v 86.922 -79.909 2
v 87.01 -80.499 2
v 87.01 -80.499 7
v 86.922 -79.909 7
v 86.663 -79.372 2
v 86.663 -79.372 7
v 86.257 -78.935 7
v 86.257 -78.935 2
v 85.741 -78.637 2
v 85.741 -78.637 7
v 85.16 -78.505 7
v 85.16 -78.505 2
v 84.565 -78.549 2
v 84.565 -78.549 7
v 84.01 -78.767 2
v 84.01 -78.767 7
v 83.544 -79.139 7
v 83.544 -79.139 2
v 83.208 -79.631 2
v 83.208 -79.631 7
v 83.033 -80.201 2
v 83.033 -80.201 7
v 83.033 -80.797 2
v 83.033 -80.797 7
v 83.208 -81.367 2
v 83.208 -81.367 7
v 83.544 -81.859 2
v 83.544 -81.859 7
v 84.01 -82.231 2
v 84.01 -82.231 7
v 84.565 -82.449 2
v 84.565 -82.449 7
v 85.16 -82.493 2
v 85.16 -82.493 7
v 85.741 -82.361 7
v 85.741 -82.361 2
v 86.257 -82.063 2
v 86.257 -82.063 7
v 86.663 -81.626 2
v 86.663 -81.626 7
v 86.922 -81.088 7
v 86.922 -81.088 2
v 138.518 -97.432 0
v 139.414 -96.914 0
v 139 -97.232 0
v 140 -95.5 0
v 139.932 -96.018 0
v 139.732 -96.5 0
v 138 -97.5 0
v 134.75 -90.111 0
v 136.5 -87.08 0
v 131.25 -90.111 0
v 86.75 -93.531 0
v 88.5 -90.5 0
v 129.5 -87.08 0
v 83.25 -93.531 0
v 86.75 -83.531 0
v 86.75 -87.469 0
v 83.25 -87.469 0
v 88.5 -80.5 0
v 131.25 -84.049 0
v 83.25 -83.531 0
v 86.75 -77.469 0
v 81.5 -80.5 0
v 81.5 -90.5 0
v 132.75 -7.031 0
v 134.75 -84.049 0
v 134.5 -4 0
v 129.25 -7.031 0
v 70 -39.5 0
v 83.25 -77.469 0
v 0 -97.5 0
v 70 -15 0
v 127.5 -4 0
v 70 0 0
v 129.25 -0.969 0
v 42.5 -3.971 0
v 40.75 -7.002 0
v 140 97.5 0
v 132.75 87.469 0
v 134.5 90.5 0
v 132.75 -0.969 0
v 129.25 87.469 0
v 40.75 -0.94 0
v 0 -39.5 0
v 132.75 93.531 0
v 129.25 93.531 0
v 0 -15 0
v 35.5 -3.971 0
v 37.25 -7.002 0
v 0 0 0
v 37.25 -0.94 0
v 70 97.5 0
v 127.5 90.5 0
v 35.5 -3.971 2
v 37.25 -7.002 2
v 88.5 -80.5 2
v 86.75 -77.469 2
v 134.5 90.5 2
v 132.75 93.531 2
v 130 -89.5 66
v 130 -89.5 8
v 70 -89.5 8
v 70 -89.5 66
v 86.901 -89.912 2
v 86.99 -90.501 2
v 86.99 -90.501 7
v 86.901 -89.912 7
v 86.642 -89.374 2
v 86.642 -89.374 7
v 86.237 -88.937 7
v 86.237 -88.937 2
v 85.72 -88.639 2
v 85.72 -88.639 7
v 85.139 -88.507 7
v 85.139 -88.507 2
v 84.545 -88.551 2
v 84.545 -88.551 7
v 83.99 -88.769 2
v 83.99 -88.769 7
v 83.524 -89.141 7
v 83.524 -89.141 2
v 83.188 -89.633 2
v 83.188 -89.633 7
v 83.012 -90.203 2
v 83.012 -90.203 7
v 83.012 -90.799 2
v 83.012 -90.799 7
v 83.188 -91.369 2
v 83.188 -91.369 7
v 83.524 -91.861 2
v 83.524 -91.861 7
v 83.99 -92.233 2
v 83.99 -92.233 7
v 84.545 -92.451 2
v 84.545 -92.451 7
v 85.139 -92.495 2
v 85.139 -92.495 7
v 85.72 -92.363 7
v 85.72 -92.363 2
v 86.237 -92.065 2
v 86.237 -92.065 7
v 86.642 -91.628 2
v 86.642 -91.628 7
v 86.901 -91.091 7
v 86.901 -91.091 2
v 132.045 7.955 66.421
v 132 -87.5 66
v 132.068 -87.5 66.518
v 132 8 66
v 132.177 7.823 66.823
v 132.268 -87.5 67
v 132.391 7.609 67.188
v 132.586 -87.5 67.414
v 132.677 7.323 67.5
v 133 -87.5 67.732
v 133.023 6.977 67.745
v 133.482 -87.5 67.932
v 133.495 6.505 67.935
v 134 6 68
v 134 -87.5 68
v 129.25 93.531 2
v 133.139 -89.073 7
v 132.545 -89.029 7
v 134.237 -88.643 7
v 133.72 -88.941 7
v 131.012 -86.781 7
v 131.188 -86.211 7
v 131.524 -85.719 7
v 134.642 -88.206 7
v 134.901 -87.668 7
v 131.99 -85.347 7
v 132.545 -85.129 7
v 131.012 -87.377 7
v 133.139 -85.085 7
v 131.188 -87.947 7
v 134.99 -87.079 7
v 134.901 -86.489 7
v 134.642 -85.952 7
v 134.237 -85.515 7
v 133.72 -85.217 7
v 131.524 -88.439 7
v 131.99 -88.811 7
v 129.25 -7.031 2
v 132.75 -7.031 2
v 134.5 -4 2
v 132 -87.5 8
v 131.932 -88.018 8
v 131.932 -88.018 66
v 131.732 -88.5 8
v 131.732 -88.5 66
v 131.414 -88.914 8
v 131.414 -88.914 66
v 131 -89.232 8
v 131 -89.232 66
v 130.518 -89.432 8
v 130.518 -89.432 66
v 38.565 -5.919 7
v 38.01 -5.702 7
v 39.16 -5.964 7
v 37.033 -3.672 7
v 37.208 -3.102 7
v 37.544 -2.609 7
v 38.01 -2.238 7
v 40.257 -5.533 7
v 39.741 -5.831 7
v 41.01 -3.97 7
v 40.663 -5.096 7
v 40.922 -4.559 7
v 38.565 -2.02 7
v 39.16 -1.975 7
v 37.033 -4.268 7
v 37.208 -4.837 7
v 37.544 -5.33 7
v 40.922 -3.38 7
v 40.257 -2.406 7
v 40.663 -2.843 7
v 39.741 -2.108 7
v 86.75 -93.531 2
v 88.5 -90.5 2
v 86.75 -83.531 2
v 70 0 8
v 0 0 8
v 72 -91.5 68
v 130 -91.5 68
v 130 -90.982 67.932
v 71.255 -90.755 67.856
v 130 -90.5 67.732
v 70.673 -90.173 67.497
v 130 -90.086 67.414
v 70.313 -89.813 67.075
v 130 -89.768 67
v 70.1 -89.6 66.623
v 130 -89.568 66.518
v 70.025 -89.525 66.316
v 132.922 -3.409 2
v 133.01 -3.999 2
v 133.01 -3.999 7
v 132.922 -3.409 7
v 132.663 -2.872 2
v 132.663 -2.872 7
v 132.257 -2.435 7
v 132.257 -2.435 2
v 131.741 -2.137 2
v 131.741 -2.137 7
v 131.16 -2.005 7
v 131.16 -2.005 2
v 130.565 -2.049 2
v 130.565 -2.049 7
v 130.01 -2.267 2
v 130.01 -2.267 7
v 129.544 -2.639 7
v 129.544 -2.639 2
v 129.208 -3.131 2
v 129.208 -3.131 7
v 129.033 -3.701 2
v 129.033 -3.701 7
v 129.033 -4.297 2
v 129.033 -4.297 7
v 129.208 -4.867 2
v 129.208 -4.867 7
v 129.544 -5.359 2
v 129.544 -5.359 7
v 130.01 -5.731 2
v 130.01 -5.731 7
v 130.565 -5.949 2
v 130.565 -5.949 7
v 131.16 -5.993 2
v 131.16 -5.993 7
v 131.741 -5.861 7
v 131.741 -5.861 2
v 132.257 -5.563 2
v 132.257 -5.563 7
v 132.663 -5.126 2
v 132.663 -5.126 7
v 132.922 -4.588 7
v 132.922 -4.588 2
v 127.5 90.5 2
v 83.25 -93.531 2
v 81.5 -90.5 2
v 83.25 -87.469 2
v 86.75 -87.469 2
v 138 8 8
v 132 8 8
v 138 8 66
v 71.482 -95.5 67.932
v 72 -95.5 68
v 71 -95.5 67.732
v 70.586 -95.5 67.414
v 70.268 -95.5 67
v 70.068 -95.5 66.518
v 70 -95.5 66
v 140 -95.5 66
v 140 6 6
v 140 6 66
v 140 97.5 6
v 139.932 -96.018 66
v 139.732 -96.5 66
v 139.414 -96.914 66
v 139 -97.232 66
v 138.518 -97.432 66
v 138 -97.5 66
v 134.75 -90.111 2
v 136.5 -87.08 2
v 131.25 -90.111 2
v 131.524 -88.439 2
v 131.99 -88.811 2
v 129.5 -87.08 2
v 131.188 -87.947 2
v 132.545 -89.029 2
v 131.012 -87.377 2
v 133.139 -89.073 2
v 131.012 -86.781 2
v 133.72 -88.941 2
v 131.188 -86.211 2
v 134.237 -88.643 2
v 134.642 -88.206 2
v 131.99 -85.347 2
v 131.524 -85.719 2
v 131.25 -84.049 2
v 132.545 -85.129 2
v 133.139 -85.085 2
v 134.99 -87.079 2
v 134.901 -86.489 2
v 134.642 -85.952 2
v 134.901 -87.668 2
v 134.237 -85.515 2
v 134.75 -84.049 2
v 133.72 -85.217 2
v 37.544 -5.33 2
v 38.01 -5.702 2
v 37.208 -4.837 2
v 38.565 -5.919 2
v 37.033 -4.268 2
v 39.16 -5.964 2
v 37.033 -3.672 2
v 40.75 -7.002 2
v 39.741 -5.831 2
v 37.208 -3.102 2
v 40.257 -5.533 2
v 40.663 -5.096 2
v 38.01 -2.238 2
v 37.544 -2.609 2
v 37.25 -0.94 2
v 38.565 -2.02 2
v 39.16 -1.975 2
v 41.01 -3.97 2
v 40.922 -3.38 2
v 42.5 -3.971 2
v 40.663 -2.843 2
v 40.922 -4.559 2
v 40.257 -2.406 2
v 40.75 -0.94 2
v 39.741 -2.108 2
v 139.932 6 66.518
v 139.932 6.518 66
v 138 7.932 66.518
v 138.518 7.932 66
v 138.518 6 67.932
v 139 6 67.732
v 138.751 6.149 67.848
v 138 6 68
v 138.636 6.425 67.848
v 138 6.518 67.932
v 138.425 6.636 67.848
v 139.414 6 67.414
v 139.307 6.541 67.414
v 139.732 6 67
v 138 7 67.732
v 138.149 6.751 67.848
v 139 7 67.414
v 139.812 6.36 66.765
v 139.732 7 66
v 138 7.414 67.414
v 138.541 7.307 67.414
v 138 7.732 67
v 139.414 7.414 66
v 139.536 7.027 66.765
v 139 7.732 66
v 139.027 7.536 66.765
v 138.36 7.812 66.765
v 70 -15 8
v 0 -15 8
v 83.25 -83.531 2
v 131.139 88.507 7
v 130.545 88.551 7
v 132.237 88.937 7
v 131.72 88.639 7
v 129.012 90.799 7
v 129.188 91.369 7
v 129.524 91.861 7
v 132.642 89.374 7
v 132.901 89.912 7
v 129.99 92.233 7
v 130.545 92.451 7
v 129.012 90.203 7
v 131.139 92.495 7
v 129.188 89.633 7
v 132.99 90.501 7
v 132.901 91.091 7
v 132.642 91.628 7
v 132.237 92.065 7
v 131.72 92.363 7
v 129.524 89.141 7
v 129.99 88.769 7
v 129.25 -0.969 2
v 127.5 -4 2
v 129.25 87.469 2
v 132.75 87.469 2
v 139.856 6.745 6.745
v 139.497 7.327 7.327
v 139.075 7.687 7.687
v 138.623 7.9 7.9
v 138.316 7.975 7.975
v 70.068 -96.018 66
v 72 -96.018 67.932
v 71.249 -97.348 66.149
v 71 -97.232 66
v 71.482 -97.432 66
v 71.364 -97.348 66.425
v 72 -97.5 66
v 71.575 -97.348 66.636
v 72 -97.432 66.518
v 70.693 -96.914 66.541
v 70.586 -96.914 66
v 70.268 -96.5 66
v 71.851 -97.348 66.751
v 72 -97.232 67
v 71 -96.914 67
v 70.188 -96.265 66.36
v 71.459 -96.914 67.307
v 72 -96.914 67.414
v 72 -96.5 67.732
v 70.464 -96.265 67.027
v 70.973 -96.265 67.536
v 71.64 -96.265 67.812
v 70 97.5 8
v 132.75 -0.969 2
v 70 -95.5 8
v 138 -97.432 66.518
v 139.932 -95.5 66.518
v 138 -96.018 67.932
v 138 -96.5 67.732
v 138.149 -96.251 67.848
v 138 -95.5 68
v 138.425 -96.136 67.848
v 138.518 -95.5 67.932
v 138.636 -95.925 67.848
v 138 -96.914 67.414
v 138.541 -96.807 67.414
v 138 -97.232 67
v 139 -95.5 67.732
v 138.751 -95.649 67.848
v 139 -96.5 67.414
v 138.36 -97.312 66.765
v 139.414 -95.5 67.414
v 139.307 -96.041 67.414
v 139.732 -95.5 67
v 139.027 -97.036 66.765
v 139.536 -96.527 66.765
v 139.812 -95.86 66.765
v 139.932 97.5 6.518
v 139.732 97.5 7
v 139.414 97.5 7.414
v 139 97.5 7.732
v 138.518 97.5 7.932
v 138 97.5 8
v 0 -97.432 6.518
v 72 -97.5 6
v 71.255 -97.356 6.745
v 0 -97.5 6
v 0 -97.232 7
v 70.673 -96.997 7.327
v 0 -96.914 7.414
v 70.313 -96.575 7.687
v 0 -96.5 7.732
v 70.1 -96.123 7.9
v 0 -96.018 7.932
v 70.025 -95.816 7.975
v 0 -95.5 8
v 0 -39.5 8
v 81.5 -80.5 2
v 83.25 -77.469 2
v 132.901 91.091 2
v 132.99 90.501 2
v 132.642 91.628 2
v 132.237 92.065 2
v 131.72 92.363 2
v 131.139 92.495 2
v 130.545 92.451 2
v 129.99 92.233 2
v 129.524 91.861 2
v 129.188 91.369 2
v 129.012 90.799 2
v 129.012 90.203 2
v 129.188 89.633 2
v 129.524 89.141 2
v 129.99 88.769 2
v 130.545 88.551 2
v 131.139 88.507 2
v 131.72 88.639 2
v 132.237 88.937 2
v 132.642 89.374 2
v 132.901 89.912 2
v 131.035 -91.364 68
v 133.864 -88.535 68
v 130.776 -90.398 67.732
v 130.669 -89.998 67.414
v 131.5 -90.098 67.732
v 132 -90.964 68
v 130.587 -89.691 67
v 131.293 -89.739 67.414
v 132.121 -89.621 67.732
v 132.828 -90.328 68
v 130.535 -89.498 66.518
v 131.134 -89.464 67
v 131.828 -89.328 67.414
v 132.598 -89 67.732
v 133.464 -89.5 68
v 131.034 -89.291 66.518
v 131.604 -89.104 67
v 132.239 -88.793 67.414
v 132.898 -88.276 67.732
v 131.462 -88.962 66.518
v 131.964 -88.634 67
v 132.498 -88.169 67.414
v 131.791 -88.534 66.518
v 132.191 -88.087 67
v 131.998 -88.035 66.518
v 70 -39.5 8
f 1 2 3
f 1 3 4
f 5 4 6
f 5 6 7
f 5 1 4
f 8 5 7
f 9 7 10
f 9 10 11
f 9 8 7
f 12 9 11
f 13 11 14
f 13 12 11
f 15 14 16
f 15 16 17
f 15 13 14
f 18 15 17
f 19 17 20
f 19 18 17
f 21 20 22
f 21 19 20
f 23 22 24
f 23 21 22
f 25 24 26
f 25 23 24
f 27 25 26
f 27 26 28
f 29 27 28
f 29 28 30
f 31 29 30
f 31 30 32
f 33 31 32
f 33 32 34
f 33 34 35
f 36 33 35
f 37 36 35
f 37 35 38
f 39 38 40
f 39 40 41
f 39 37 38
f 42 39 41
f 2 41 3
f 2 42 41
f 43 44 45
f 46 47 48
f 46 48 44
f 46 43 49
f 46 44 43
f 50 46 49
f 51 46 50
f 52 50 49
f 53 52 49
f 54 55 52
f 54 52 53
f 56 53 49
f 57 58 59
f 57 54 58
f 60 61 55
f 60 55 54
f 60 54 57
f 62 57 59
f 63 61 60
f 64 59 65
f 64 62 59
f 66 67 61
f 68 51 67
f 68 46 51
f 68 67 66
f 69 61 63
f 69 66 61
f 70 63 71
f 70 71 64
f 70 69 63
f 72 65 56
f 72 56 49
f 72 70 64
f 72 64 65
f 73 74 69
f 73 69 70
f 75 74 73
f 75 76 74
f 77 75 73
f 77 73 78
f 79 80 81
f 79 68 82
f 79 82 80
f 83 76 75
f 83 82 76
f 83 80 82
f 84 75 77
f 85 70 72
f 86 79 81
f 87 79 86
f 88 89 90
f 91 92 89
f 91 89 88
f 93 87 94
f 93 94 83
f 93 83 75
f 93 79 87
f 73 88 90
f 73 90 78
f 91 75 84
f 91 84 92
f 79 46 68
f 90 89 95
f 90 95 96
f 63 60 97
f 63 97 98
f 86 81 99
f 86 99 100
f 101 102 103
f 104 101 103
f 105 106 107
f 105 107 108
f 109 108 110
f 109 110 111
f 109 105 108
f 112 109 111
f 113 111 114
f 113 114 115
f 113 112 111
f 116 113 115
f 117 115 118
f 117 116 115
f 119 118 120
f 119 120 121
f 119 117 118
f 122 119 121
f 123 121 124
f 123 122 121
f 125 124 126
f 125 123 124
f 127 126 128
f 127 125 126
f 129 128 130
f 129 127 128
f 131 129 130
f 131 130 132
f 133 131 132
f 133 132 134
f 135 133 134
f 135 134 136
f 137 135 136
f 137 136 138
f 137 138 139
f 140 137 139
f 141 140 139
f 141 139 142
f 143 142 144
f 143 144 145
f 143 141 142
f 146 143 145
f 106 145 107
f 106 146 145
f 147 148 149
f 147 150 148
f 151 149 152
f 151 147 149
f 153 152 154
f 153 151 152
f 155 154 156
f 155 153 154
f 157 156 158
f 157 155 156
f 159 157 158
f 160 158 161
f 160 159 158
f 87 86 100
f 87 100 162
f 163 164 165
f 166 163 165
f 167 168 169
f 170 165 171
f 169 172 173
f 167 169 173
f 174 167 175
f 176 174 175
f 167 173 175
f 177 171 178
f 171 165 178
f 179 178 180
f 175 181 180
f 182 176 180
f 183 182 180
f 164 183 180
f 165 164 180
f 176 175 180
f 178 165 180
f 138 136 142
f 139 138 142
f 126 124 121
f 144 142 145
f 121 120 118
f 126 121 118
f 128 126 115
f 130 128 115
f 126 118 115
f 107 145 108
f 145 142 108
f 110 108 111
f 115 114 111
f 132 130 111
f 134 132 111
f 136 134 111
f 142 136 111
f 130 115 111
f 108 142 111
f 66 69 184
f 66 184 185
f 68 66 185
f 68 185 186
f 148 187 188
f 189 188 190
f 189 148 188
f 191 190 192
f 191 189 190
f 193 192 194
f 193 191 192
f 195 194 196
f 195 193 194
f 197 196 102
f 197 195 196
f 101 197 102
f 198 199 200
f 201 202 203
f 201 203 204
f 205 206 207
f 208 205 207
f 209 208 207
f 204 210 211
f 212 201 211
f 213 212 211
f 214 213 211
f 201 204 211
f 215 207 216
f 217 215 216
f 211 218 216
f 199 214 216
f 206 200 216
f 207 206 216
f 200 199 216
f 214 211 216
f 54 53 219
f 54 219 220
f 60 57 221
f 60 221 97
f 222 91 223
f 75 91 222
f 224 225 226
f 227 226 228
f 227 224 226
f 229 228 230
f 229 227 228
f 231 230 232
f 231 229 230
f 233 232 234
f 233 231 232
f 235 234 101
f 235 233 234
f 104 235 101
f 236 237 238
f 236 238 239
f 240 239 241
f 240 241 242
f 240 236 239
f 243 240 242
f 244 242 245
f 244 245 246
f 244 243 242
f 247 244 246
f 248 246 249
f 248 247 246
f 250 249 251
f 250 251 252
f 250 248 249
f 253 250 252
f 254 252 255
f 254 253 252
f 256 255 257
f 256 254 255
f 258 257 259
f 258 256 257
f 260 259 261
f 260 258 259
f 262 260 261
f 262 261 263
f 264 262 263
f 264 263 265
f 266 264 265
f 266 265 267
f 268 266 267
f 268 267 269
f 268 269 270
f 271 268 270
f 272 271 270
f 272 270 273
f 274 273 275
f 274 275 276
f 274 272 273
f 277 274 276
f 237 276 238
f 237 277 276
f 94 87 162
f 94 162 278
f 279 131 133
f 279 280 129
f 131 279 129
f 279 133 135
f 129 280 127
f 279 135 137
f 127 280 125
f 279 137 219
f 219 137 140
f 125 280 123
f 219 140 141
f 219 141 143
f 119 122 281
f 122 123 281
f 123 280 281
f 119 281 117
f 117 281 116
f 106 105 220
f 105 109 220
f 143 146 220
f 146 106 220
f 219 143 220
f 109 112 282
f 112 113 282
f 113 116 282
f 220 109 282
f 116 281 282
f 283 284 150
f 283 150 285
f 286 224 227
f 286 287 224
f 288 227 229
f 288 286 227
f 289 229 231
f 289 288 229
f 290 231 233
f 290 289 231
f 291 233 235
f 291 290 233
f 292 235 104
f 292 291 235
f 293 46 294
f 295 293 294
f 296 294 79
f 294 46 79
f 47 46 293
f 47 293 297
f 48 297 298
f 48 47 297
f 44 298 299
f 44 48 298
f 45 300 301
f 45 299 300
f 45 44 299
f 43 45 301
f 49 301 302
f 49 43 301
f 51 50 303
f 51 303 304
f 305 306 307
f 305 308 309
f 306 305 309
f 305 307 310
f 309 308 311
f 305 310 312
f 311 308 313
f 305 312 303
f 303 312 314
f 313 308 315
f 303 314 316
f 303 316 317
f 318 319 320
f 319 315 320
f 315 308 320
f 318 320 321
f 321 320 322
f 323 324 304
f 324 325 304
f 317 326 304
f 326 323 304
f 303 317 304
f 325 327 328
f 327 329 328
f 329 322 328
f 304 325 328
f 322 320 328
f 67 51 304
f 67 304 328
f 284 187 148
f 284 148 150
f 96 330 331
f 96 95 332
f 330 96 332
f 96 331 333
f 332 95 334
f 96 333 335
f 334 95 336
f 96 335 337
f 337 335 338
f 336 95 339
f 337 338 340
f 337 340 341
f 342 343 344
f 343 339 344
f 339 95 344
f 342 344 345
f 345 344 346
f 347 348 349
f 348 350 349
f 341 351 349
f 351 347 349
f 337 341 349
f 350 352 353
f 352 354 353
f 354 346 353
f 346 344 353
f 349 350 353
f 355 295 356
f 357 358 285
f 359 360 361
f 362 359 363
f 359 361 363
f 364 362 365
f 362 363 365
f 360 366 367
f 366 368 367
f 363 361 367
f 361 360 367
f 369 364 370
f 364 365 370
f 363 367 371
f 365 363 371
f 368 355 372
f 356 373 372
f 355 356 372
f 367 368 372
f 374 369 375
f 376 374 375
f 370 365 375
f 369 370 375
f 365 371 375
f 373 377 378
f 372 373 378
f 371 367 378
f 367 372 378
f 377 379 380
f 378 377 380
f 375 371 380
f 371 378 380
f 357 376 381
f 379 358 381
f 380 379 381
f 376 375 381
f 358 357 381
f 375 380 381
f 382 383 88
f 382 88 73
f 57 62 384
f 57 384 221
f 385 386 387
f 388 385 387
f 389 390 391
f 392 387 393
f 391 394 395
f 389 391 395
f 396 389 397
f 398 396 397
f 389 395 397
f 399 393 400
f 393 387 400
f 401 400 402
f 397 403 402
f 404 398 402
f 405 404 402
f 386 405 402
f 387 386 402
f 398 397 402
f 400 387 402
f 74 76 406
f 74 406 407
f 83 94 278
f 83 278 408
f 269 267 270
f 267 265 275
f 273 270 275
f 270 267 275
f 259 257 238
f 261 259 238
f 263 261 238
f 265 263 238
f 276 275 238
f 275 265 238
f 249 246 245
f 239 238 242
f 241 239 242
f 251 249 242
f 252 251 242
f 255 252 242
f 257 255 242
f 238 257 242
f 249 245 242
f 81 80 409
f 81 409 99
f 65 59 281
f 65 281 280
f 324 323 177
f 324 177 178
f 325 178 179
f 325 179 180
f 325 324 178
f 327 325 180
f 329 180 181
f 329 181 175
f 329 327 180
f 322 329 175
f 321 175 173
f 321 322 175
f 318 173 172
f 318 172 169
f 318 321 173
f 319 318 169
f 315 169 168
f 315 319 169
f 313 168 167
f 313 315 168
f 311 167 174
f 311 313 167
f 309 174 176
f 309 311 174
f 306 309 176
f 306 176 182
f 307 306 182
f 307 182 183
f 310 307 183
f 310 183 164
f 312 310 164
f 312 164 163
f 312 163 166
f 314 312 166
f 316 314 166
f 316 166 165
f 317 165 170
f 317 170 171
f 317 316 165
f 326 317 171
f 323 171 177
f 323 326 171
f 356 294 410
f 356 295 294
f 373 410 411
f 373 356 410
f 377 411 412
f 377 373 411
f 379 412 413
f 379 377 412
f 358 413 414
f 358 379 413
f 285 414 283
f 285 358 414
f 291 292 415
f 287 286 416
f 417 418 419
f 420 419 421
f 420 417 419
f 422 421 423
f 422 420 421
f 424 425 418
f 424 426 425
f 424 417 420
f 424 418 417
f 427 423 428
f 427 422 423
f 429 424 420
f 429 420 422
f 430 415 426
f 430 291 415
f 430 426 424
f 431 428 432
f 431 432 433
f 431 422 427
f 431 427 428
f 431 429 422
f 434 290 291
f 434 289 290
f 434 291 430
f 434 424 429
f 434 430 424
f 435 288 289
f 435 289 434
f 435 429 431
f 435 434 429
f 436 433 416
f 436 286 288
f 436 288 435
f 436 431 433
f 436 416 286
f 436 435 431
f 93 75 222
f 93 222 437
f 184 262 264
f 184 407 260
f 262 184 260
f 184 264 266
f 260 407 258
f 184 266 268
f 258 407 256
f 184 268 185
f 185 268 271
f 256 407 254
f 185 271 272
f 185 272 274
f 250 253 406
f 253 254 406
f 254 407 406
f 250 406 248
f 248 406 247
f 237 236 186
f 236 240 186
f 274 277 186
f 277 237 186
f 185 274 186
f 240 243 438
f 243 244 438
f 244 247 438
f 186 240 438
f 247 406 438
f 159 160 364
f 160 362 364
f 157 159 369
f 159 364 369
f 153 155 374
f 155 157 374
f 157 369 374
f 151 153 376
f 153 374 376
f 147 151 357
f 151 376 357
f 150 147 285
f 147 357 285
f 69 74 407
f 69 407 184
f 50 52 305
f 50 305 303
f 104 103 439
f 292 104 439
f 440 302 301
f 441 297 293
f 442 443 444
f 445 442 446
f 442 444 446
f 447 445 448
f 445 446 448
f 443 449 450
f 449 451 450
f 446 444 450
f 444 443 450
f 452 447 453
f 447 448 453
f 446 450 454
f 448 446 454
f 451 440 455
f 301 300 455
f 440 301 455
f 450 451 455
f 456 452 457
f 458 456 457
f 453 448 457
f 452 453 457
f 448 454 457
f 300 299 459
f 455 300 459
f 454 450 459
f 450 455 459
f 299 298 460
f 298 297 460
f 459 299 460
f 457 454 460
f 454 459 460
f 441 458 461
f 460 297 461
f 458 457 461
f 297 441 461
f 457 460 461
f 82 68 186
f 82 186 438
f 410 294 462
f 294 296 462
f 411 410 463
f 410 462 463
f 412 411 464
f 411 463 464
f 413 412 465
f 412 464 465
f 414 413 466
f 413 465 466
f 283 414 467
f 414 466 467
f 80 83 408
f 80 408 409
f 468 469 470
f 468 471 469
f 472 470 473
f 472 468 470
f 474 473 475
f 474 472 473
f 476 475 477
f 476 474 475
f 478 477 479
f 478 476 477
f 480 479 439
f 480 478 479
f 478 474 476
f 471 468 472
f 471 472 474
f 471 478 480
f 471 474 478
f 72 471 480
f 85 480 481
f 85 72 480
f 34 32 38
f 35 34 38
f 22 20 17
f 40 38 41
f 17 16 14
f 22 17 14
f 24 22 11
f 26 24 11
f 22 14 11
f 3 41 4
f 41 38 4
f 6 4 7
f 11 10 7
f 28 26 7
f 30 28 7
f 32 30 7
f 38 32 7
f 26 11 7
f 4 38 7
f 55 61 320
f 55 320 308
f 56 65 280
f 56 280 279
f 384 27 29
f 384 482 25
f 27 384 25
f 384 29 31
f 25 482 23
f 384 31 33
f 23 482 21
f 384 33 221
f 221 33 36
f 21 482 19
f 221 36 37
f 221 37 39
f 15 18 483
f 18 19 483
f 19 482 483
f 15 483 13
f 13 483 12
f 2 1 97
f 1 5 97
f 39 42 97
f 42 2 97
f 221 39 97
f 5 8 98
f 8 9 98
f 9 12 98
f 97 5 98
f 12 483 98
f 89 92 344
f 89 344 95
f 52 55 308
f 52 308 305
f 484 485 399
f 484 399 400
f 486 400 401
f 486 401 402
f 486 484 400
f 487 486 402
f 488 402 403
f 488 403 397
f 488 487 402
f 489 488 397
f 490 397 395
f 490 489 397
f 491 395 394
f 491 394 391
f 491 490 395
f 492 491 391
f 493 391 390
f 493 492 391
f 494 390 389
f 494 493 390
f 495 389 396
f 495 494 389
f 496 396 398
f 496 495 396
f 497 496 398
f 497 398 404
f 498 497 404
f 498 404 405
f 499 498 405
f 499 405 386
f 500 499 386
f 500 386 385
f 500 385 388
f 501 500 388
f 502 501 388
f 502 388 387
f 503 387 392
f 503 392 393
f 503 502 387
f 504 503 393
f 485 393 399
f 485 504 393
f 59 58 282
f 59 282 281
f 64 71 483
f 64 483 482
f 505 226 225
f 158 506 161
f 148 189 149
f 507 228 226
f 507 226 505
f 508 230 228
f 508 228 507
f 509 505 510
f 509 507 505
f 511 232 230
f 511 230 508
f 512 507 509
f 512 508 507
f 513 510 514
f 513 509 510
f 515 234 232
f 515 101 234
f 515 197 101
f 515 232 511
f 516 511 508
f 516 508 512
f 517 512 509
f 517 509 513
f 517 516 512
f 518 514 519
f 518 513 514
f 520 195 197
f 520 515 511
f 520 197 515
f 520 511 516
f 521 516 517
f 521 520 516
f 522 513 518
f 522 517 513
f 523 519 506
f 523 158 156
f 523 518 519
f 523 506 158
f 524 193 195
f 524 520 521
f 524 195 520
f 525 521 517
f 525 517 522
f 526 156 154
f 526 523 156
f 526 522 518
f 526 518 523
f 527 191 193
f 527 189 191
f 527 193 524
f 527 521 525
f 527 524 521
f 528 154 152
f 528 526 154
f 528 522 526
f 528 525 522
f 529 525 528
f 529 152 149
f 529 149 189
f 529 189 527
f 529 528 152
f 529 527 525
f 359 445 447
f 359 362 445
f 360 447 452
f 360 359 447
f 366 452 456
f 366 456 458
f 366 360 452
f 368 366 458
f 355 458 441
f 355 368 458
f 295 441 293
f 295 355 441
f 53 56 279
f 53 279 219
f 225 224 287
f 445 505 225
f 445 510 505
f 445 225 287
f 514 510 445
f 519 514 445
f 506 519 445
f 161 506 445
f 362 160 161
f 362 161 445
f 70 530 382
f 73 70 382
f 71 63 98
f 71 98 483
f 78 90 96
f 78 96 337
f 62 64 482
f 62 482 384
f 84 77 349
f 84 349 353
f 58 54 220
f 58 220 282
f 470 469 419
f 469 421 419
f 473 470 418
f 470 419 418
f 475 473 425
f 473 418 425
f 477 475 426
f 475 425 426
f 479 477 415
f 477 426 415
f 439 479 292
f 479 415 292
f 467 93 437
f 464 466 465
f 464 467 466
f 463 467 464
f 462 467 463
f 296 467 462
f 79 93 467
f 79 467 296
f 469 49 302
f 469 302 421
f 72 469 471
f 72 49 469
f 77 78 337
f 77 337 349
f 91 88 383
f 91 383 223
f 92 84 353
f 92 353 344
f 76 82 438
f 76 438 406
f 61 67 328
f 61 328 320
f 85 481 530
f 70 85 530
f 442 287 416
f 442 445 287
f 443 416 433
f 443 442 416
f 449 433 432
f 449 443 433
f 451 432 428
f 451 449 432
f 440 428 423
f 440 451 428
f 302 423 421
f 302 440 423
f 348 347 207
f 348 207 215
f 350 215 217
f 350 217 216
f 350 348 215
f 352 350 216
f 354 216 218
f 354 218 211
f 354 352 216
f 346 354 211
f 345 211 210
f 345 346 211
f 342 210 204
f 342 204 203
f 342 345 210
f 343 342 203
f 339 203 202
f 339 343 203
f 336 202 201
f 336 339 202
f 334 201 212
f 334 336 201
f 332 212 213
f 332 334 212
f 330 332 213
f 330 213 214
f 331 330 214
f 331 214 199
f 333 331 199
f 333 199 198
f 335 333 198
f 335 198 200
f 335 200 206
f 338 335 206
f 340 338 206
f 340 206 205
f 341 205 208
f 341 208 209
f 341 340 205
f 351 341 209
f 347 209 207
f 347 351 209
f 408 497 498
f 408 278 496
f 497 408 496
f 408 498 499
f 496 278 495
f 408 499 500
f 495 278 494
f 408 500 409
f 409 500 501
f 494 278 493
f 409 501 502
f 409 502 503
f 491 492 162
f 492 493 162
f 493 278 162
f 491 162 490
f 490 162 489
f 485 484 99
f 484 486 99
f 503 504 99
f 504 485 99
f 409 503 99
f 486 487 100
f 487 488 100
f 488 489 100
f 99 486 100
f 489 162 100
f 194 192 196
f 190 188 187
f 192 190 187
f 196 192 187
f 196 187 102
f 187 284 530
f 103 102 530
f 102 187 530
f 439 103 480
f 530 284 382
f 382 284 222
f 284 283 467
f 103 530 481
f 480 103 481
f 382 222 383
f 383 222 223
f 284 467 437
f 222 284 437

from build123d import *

# Parameters (mm, degrees)
EXTRUDE_1_DEPTH     = 8
CUT_EXTRUDE_1_DEPTH = 2
SKETCH_3_R          = 2
CUT_EXTRUDE_2_DEPTH = 5
SKETCH_4_W          = 8
SKETCH_4_H          = 97.5
EXTRUDE_2_DEPTH     = 60
FILLET_1_R          = 2
SKETCH_5_W          = 70
SKETCH_5_H          = 24.5
CUT_EXTRUDE_4_DEPTH = 20


with BuildPart() as part:
    # 스케치1 → 보스-돌출1 (new body)
    with BuildSketch(Plane.XY):
        Polygon((0, 0), (70, 0), (70, 97.5), (140, 97.5), (140, -19.573170732), (140, -97.5), (0, -97.5), align=None)
    extrude(amount=EXTRUDE_1_DEPTH)

    # 스케치2 → 컷-돌출1 (cut)
    with BuildSketch(Plane.XY):
        Polygon((127.5, 90.5), (129.25, 87.468911087), (132.75, 87.468911087), (134.5, 90.5), (132.75, 93.531088913), (129.25, 93.531088913), align=None)
        Polygon((129.25, -7.031088913), (132.75, -7.031088913), (134.5, -4), (132.75, -0.968911087), (129.25, -0.968911087), (127.5, -4), align=None)
        Polygon((136.5, -87.08), (134.75, -84.048911087), (131.25, -84.048911087), (129.5, -87.08), (131.25, -90.111088913), (134.75, -90.111088913), align=None)
        Polygon((83.25, -77.468911087), (81.5, -80.5), (83.25, -83.531088913), (86.75, -83.531088913), (88.5, -80.5), (86.75, -77.468911087), align=None)
        Polygon((83.25, -87.468911087), (81.5, -90.5), (83.25, -93.531088913), (86.75, -93.531088913), (88.5, -90.5), (86.75, -87.468911087), align=None)
        Polygon((37.25, -7.001775013), (40.75, -7.001775013), (42.5, -3.9706861), (40.75, -0.939597187), (37.25, -0.939597187), (35.5, -3.9706861), align=None)
    extrude(amount=CUT_EXTRUDE_1_DEPTH, mode=Mode.SUBTRACT)

    # 스케치3 → 컷-돌출2 (cut)
    with BuildSketch(Plane.XY.offset(2)):
        with Locations((130.98963708, 90.501088913)):
            Circle(SKETCH_3_R)
        with Locations((131.01036292, -3.998911087)):
            Circle(SKETCH_3_R)
        with Locations((39.010362751, -3.969597187)):
            Circle(SKETCH_3_R)
        with Locations((85.01036292, -80.498911087)):
            Circle(SKETCH_3_R)
        with Locations((84.989637249, -90.501088913)):
            Circle(SKETCH_3_R)
        with Locations((132.98963708, -87.078911087)):
            Circle(SKETCH_3_R)
    extrude(amount=CUT_EXTRUDE_2_DEPTH, mode=Mode.SUBTRACT)

    # 스케치4 → 보스-돌출2 (add)
    with BuildSketch(Plane.XY.offset(8)):
        with Locations((136, -40.75)):
            Rectangle(SKETCH_4_W, SKETCH_4_H)
        Polygon((70, -97.5), (140, -97.5), (140, -89.5), (132, -89.5), (70, -89.5), align=None)
    extrude(amount=EXTRUDE_2_DEPTH)

    # 필렛1
    fillet_1_edges = [part.edges().sort_by_distance(p)[0] for p in [
        (140, -97.5, 34),
        (140, 52.75, 8),
        (132, -40.75, 68),
        (132, -89.5, 38),
        (70, -93.5, 68),
        (70, -97.5, 38),
        (140, 8, 38),
        (101, -89.5, 68),
        (105, -97.5, 68),
        (140, -44.75, 68),
        (136, 8, 68),
        (35, -97.5, 8),
    ]]
    fillet(fillet_1_edges, radius=FILLET_1_R)

    # 스케치5 → 컷-돌출4 (cut)
    with BuildSketch(Plane.XY.offset(8)):
        with Locations((35, -27.25)):
            Rectangle(SKETCH_5_W, SKETCH_5_H)
    extrude(amount=-CUT_EXTRUDE_4_DEPTH, mode=Mode.SUBTRACT)


solid = part.part
